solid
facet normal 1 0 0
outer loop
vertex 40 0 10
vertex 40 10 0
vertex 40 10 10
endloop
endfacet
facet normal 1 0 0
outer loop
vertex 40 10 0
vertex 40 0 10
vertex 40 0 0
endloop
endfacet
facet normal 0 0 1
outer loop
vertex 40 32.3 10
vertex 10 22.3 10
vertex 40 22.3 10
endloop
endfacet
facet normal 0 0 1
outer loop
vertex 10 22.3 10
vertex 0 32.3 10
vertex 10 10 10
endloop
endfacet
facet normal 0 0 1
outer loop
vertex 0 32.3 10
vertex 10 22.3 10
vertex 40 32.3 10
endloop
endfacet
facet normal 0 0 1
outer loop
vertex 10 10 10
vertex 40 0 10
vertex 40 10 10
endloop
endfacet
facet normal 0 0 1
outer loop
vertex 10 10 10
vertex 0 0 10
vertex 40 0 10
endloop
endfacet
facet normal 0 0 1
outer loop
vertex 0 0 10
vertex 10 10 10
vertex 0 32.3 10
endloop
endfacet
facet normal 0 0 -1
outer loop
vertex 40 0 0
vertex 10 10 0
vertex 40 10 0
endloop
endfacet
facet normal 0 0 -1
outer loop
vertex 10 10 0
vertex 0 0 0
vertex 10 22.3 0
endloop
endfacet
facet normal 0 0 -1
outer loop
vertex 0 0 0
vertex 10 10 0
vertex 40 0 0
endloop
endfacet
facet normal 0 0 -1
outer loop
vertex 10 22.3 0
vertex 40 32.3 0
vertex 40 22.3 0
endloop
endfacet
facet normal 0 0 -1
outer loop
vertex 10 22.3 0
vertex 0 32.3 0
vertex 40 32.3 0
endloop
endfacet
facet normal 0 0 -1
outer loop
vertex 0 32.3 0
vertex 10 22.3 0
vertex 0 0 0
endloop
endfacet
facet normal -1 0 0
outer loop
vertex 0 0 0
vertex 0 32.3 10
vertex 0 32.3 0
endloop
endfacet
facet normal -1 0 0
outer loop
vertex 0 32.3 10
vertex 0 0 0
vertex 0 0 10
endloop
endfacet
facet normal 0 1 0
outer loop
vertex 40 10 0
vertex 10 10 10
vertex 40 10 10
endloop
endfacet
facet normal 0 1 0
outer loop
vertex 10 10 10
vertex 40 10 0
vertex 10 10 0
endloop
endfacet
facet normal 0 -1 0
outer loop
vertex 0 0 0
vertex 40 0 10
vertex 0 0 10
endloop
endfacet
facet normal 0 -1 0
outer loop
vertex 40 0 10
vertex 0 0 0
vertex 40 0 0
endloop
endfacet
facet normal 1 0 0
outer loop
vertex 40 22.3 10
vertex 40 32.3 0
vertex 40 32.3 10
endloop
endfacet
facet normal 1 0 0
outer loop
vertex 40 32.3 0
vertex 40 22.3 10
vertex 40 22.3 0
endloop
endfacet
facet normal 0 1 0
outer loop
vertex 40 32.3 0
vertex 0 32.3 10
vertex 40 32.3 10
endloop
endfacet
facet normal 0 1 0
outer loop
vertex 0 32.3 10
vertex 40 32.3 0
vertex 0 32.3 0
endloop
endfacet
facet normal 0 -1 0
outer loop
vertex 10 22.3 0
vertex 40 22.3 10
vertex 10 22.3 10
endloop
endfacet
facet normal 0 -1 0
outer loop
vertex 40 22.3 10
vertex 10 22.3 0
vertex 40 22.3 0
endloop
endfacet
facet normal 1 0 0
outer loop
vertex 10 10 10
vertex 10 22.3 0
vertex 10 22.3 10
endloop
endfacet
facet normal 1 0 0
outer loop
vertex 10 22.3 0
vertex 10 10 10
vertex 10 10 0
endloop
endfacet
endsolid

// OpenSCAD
union(){
cube([40,10,10]);
translate([0,22.3,0])cube([40,10,10]);
translate([0,10,0])cube([10,12.3,10]);
}
